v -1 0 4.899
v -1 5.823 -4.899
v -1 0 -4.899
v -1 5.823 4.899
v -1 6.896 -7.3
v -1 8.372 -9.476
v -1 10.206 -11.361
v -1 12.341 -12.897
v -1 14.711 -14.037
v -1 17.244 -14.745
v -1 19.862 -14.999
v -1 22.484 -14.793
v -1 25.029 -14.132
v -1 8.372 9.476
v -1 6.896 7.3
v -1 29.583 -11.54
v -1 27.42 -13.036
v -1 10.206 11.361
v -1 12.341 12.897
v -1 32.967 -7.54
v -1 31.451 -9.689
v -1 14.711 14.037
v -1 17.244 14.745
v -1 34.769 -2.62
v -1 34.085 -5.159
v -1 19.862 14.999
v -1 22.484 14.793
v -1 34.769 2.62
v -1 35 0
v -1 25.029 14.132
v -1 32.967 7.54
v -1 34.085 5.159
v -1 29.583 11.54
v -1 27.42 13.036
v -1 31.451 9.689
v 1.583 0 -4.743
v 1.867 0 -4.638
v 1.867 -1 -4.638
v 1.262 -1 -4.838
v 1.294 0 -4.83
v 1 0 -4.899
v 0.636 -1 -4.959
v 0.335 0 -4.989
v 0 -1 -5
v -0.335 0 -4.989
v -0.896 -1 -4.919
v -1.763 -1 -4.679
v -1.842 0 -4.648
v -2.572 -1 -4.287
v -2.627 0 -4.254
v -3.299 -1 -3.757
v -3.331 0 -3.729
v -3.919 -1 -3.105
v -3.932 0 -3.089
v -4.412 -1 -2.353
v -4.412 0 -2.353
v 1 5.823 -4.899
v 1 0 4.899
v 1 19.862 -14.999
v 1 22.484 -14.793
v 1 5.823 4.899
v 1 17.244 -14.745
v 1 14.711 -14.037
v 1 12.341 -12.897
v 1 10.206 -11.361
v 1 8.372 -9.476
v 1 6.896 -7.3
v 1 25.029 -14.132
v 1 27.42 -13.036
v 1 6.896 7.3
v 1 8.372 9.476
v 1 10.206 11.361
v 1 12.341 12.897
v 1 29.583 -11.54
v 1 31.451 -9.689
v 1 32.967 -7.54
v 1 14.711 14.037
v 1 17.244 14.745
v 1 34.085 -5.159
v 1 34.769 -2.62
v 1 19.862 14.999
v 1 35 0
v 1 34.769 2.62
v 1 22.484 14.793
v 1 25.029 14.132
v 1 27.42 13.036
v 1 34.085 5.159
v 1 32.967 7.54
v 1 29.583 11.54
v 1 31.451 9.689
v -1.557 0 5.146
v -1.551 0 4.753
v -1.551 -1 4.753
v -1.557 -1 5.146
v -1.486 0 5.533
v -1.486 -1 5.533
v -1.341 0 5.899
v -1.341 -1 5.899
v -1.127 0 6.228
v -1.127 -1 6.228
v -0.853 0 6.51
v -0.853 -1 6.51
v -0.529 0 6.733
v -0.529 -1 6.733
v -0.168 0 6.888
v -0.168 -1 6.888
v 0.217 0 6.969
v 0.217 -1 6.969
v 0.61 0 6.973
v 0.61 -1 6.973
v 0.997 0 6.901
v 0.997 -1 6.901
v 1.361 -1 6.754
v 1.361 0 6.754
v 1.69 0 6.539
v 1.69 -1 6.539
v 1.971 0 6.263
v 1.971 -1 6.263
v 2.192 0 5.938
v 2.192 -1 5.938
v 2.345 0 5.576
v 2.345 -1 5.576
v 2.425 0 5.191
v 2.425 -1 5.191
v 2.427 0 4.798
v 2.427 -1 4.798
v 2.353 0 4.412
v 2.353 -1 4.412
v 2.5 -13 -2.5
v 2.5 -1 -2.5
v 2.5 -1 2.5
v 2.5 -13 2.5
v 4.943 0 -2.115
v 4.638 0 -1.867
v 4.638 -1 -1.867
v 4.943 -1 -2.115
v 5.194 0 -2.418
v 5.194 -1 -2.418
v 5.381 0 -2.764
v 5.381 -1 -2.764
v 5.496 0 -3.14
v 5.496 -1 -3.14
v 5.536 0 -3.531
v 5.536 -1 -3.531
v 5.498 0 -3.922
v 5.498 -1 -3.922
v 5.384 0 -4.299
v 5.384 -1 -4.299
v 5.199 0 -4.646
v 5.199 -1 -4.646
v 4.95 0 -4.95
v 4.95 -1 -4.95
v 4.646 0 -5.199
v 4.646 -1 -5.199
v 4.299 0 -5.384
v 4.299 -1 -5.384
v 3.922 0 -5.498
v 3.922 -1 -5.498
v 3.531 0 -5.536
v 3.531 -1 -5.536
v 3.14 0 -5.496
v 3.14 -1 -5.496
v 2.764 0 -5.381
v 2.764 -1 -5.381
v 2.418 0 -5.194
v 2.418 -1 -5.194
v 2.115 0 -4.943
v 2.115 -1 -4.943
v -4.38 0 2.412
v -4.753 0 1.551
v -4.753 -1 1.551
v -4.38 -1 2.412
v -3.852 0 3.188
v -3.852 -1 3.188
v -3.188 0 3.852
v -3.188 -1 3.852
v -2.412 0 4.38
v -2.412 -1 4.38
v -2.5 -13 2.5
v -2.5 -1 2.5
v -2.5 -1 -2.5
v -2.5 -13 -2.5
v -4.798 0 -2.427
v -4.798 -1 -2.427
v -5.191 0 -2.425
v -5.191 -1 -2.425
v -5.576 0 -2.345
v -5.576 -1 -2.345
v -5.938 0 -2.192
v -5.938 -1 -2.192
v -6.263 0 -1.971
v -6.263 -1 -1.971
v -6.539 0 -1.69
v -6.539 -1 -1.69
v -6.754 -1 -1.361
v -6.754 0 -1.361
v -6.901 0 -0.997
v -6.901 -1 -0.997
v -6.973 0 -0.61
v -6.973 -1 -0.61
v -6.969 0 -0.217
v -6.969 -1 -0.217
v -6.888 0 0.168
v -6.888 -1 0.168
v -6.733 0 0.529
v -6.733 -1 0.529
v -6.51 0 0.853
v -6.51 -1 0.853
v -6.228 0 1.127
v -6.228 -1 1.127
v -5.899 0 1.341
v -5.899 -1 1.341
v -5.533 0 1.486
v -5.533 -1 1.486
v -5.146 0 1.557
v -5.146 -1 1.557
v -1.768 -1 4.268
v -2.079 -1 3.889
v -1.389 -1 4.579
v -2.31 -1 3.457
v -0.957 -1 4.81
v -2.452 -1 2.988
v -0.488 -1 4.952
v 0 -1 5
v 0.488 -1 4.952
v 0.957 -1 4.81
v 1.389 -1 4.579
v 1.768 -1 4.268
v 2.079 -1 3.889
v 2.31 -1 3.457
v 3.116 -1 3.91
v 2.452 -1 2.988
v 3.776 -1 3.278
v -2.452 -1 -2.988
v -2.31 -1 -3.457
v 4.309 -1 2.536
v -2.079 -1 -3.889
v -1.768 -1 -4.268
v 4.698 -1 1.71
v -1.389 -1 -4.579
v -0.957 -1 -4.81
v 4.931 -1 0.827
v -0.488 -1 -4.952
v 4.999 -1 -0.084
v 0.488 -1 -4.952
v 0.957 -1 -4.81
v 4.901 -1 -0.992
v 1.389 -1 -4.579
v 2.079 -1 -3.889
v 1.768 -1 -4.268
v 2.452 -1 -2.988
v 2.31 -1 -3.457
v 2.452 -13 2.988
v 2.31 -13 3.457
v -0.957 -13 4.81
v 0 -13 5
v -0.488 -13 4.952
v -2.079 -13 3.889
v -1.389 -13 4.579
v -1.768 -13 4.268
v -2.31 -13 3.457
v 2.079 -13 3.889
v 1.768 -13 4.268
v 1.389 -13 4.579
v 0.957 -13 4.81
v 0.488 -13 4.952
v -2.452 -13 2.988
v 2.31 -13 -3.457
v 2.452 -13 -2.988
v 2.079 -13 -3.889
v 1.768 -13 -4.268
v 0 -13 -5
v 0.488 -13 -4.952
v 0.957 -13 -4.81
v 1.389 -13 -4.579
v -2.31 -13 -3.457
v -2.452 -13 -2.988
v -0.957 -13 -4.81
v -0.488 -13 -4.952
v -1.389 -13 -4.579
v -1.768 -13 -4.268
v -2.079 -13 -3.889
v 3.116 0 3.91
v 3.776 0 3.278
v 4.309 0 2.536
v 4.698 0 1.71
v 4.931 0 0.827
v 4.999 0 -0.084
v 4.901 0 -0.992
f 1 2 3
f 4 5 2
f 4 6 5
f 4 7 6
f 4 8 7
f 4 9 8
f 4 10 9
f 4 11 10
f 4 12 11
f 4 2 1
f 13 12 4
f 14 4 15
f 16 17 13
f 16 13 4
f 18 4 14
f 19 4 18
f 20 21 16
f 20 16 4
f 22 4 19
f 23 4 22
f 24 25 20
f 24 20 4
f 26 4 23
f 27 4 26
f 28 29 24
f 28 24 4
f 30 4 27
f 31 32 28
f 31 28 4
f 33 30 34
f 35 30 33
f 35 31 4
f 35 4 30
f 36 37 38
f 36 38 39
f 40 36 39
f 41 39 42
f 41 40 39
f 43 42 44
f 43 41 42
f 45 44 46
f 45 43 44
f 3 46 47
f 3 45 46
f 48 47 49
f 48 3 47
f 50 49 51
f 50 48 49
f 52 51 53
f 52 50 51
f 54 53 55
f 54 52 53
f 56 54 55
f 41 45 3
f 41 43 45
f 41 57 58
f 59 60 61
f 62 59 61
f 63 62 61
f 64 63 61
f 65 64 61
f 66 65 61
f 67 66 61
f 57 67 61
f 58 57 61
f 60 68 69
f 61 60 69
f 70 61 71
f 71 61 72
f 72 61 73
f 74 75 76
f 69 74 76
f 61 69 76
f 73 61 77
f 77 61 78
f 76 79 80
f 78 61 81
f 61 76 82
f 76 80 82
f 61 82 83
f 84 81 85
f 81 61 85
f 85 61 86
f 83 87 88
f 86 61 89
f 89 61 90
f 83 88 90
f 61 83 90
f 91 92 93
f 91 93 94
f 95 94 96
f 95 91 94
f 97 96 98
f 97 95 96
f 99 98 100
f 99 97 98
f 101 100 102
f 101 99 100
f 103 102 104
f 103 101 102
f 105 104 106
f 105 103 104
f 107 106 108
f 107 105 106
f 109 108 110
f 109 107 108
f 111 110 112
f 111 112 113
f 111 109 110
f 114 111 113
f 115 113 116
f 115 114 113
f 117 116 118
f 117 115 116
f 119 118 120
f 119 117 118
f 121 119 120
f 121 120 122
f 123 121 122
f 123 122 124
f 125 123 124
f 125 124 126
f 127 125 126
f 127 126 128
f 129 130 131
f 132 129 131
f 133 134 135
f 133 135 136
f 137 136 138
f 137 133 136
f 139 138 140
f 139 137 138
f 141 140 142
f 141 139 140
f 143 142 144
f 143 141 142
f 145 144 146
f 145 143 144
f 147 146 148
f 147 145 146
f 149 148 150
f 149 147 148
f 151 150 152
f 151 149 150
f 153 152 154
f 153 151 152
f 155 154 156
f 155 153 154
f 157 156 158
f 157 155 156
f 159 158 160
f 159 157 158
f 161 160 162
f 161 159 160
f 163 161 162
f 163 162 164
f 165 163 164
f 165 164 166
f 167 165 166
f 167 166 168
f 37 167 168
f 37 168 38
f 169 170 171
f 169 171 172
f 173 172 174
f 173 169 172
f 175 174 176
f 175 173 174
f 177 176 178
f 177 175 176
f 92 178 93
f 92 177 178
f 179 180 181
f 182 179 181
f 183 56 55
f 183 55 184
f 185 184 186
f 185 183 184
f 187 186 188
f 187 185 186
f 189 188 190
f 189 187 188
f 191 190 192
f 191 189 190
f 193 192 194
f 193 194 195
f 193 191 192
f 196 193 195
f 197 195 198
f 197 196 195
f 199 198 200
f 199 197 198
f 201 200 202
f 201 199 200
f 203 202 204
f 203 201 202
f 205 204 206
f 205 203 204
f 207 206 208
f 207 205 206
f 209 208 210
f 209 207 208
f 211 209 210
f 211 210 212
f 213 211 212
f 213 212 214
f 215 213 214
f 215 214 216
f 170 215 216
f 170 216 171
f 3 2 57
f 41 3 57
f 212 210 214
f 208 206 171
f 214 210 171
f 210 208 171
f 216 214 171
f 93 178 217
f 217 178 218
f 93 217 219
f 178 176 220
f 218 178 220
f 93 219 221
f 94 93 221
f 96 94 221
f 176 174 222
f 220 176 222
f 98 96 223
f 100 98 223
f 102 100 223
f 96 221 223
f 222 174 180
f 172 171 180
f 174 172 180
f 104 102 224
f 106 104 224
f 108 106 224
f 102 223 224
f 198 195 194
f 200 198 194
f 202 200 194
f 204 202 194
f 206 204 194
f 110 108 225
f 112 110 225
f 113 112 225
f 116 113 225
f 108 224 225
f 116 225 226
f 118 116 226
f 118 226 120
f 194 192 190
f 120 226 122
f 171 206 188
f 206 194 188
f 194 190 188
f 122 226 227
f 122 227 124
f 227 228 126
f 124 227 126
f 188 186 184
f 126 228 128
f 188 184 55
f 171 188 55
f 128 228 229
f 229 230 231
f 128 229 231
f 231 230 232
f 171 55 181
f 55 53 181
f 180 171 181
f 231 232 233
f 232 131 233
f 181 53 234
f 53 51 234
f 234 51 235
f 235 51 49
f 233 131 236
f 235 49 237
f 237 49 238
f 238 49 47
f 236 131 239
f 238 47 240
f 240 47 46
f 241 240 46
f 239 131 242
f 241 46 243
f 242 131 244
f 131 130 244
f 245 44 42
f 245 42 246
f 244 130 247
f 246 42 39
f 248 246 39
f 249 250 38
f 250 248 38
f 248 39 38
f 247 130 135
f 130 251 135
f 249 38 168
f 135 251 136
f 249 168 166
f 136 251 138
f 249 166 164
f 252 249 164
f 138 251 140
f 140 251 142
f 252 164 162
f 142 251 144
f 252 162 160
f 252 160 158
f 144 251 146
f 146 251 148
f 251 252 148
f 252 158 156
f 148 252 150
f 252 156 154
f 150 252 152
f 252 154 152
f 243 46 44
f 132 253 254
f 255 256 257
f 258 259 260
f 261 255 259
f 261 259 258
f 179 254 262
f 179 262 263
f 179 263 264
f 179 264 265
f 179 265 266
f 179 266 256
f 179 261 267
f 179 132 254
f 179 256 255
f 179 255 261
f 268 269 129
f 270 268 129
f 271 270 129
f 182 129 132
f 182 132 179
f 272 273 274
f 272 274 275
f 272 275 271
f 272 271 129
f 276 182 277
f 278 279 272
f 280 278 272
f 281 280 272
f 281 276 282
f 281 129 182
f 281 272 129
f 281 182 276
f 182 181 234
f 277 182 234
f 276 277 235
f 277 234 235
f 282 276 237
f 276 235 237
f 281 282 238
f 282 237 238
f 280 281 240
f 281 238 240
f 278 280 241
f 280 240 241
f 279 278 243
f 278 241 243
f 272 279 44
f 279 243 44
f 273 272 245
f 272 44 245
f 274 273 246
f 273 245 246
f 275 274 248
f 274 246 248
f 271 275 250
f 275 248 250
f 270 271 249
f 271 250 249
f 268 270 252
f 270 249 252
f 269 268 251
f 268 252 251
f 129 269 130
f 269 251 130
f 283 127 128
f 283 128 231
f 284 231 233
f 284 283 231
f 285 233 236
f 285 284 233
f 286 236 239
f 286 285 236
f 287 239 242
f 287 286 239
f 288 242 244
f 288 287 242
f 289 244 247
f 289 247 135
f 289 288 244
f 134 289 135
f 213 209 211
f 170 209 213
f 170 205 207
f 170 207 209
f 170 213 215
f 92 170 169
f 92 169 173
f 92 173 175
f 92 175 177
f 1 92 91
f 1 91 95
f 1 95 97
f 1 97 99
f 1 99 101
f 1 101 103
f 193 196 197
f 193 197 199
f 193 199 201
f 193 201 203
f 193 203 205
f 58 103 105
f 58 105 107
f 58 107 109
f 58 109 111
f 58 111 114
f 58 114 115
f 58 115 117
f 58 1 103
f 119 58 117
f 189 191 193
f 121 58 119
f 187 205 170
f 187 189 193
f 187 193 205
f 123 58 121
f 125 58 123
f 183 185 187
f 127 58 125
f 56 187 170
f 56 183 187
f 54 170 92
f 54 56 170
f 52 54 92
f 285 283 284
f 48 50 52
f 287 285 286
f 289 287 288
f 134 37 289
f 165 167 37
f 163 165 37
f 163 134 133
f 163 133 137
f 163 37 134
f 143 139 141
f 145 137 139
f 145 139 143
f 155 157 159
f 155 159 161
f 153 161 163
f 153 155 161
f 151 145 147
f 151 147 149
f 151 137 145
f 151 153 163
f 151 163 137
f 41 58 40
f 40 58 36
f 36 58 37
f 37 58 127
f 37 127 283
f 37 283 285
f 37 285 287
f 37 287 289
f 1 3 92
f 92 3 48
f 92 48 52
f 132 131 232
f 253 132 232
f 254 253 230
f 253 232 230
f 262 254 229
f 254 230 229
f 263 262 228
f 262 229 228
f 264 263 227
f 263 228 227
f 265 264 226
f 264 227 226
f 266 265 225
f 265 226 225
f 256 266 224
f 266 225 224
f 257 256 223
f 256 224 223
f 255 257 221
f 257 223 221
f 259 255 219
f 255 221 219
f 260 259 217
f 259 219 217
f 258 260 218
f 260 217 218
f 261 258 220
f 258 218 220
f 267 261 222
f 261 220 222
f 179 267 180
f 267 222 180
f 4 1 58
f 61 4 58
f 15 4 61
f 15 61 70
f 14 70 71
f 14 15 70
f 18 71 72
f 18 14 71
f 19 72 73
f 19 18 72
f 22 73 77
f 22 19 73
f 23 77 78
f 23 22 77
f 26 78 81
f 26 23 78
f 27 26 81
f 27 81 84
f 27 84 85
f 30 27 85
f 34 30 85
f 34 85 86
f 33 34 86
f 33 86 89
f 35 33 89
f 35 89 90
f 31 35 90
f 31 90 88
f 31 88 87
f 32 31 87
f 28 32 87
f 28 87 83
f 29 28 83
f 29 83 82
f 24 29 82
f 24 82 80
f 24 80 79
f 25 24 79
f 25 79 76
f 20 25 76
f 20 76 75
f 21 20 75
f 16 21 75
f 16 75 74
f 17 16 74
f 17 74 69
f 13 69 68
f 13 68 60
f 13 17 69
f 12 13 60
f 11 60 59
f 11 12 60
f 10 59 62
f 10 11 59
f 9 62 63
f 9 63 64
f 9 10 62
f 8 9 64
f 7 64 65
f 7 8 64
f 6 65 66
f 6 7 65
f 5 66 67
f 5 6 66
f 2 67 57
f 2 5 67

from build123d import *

# Parameters (mm, degrees)
BOSS_EXTRUDE1_DEPTH = 13
BOSS_EXTRUDE2_DEPTH = 1
SKETCH1_5_W         = 2
SKETCH1_5_H         = 9.797958972
BOSS_EXTRUDE3_DEPTH = 20
SKETCH2_R           = 15
BOSS_EXTRUDE4_DEPTH = 2


with BuildPart() as part:
    # Sketch1 → Boss-Extrude1 (new body)
    with BuildSketch(Plane(origin=(0, 0, 0), x_dir=(1, 0, 0), z_dir=(0, 1, 0))):
        with BuildLine():
            Line((2.5, 2.5), (2.5, -2.5))
            ThreePointArc((2.5, -2.5), (0, -5), (-2.5, -2.5))
            Line((-2.5, -2.5), (-2.5, 2.5))
            ThreePointArc((-2.5, 2.5), (0, 5), (2.5, 2.5))
        make_face()
    extrude(amount=-BOSS_EXTRUDE1_DEPTH)

    # Sketch1<3> → Boss-Extrude2 (add)
    with BuildSketch(Plane(origin=(0, 0, 0), x_dir=(1, 0, 0), z_dir=(0, 1, 0))):
        with BuildLine():
            ThreePointArc((1.867050547, 4.63833184), (-1.710100717, 4.698463104), (-4.411705933, 2.353051372))
            ThreePointArc((-4.411705933, 2.353051372), (-6.973362887, 0.610090199), (-4.75328529, -1.551218539))
            ThreePointArc((-4.75328529, -1.551218539), (-3.535533906, -3.535533906), (-1.551218539, -4.75328529))
            ThreePointArc((-1.551218539, -4.75328529), (0.610090199, -6.973362887), (2.353051372, -4.411705933))
            ThreePointArc((2.353051372, -4.411705933), (4.698463104, -1.710100717), (4.63833184, 1.867050547))
            ThreePointArc((4.63833184, 1.867050547), (4.949747468, 4.949747468), (1.867050547, 4.63833184))
        make_face()
    extrude(amount=-BOSS_EXTRUDE2_DEPTH)

    # Sketch1<5> → Boss-Extrude3 (add)
    with BuildSketch(Plane(origin=(0, 0, 0), x_dir=(1, 0, 0), z_dir=(0, 1, 0))):
        Rectangle(SKETCH1_5_W, SKETCH1_5_H)
    extrude(amount=BOSS_EXTRUDE3_DEPTH)

    # Sketch2 → Boss-Extrude4 (add)
    with BuildSketch(Plane.ZY.offset(1)):
        with Locations((0, 20)):
            Circle(SKETCH2_R)
    extrude(amount=-BOSS_EXTRUDE4_DEPTH)


solid = part.part
